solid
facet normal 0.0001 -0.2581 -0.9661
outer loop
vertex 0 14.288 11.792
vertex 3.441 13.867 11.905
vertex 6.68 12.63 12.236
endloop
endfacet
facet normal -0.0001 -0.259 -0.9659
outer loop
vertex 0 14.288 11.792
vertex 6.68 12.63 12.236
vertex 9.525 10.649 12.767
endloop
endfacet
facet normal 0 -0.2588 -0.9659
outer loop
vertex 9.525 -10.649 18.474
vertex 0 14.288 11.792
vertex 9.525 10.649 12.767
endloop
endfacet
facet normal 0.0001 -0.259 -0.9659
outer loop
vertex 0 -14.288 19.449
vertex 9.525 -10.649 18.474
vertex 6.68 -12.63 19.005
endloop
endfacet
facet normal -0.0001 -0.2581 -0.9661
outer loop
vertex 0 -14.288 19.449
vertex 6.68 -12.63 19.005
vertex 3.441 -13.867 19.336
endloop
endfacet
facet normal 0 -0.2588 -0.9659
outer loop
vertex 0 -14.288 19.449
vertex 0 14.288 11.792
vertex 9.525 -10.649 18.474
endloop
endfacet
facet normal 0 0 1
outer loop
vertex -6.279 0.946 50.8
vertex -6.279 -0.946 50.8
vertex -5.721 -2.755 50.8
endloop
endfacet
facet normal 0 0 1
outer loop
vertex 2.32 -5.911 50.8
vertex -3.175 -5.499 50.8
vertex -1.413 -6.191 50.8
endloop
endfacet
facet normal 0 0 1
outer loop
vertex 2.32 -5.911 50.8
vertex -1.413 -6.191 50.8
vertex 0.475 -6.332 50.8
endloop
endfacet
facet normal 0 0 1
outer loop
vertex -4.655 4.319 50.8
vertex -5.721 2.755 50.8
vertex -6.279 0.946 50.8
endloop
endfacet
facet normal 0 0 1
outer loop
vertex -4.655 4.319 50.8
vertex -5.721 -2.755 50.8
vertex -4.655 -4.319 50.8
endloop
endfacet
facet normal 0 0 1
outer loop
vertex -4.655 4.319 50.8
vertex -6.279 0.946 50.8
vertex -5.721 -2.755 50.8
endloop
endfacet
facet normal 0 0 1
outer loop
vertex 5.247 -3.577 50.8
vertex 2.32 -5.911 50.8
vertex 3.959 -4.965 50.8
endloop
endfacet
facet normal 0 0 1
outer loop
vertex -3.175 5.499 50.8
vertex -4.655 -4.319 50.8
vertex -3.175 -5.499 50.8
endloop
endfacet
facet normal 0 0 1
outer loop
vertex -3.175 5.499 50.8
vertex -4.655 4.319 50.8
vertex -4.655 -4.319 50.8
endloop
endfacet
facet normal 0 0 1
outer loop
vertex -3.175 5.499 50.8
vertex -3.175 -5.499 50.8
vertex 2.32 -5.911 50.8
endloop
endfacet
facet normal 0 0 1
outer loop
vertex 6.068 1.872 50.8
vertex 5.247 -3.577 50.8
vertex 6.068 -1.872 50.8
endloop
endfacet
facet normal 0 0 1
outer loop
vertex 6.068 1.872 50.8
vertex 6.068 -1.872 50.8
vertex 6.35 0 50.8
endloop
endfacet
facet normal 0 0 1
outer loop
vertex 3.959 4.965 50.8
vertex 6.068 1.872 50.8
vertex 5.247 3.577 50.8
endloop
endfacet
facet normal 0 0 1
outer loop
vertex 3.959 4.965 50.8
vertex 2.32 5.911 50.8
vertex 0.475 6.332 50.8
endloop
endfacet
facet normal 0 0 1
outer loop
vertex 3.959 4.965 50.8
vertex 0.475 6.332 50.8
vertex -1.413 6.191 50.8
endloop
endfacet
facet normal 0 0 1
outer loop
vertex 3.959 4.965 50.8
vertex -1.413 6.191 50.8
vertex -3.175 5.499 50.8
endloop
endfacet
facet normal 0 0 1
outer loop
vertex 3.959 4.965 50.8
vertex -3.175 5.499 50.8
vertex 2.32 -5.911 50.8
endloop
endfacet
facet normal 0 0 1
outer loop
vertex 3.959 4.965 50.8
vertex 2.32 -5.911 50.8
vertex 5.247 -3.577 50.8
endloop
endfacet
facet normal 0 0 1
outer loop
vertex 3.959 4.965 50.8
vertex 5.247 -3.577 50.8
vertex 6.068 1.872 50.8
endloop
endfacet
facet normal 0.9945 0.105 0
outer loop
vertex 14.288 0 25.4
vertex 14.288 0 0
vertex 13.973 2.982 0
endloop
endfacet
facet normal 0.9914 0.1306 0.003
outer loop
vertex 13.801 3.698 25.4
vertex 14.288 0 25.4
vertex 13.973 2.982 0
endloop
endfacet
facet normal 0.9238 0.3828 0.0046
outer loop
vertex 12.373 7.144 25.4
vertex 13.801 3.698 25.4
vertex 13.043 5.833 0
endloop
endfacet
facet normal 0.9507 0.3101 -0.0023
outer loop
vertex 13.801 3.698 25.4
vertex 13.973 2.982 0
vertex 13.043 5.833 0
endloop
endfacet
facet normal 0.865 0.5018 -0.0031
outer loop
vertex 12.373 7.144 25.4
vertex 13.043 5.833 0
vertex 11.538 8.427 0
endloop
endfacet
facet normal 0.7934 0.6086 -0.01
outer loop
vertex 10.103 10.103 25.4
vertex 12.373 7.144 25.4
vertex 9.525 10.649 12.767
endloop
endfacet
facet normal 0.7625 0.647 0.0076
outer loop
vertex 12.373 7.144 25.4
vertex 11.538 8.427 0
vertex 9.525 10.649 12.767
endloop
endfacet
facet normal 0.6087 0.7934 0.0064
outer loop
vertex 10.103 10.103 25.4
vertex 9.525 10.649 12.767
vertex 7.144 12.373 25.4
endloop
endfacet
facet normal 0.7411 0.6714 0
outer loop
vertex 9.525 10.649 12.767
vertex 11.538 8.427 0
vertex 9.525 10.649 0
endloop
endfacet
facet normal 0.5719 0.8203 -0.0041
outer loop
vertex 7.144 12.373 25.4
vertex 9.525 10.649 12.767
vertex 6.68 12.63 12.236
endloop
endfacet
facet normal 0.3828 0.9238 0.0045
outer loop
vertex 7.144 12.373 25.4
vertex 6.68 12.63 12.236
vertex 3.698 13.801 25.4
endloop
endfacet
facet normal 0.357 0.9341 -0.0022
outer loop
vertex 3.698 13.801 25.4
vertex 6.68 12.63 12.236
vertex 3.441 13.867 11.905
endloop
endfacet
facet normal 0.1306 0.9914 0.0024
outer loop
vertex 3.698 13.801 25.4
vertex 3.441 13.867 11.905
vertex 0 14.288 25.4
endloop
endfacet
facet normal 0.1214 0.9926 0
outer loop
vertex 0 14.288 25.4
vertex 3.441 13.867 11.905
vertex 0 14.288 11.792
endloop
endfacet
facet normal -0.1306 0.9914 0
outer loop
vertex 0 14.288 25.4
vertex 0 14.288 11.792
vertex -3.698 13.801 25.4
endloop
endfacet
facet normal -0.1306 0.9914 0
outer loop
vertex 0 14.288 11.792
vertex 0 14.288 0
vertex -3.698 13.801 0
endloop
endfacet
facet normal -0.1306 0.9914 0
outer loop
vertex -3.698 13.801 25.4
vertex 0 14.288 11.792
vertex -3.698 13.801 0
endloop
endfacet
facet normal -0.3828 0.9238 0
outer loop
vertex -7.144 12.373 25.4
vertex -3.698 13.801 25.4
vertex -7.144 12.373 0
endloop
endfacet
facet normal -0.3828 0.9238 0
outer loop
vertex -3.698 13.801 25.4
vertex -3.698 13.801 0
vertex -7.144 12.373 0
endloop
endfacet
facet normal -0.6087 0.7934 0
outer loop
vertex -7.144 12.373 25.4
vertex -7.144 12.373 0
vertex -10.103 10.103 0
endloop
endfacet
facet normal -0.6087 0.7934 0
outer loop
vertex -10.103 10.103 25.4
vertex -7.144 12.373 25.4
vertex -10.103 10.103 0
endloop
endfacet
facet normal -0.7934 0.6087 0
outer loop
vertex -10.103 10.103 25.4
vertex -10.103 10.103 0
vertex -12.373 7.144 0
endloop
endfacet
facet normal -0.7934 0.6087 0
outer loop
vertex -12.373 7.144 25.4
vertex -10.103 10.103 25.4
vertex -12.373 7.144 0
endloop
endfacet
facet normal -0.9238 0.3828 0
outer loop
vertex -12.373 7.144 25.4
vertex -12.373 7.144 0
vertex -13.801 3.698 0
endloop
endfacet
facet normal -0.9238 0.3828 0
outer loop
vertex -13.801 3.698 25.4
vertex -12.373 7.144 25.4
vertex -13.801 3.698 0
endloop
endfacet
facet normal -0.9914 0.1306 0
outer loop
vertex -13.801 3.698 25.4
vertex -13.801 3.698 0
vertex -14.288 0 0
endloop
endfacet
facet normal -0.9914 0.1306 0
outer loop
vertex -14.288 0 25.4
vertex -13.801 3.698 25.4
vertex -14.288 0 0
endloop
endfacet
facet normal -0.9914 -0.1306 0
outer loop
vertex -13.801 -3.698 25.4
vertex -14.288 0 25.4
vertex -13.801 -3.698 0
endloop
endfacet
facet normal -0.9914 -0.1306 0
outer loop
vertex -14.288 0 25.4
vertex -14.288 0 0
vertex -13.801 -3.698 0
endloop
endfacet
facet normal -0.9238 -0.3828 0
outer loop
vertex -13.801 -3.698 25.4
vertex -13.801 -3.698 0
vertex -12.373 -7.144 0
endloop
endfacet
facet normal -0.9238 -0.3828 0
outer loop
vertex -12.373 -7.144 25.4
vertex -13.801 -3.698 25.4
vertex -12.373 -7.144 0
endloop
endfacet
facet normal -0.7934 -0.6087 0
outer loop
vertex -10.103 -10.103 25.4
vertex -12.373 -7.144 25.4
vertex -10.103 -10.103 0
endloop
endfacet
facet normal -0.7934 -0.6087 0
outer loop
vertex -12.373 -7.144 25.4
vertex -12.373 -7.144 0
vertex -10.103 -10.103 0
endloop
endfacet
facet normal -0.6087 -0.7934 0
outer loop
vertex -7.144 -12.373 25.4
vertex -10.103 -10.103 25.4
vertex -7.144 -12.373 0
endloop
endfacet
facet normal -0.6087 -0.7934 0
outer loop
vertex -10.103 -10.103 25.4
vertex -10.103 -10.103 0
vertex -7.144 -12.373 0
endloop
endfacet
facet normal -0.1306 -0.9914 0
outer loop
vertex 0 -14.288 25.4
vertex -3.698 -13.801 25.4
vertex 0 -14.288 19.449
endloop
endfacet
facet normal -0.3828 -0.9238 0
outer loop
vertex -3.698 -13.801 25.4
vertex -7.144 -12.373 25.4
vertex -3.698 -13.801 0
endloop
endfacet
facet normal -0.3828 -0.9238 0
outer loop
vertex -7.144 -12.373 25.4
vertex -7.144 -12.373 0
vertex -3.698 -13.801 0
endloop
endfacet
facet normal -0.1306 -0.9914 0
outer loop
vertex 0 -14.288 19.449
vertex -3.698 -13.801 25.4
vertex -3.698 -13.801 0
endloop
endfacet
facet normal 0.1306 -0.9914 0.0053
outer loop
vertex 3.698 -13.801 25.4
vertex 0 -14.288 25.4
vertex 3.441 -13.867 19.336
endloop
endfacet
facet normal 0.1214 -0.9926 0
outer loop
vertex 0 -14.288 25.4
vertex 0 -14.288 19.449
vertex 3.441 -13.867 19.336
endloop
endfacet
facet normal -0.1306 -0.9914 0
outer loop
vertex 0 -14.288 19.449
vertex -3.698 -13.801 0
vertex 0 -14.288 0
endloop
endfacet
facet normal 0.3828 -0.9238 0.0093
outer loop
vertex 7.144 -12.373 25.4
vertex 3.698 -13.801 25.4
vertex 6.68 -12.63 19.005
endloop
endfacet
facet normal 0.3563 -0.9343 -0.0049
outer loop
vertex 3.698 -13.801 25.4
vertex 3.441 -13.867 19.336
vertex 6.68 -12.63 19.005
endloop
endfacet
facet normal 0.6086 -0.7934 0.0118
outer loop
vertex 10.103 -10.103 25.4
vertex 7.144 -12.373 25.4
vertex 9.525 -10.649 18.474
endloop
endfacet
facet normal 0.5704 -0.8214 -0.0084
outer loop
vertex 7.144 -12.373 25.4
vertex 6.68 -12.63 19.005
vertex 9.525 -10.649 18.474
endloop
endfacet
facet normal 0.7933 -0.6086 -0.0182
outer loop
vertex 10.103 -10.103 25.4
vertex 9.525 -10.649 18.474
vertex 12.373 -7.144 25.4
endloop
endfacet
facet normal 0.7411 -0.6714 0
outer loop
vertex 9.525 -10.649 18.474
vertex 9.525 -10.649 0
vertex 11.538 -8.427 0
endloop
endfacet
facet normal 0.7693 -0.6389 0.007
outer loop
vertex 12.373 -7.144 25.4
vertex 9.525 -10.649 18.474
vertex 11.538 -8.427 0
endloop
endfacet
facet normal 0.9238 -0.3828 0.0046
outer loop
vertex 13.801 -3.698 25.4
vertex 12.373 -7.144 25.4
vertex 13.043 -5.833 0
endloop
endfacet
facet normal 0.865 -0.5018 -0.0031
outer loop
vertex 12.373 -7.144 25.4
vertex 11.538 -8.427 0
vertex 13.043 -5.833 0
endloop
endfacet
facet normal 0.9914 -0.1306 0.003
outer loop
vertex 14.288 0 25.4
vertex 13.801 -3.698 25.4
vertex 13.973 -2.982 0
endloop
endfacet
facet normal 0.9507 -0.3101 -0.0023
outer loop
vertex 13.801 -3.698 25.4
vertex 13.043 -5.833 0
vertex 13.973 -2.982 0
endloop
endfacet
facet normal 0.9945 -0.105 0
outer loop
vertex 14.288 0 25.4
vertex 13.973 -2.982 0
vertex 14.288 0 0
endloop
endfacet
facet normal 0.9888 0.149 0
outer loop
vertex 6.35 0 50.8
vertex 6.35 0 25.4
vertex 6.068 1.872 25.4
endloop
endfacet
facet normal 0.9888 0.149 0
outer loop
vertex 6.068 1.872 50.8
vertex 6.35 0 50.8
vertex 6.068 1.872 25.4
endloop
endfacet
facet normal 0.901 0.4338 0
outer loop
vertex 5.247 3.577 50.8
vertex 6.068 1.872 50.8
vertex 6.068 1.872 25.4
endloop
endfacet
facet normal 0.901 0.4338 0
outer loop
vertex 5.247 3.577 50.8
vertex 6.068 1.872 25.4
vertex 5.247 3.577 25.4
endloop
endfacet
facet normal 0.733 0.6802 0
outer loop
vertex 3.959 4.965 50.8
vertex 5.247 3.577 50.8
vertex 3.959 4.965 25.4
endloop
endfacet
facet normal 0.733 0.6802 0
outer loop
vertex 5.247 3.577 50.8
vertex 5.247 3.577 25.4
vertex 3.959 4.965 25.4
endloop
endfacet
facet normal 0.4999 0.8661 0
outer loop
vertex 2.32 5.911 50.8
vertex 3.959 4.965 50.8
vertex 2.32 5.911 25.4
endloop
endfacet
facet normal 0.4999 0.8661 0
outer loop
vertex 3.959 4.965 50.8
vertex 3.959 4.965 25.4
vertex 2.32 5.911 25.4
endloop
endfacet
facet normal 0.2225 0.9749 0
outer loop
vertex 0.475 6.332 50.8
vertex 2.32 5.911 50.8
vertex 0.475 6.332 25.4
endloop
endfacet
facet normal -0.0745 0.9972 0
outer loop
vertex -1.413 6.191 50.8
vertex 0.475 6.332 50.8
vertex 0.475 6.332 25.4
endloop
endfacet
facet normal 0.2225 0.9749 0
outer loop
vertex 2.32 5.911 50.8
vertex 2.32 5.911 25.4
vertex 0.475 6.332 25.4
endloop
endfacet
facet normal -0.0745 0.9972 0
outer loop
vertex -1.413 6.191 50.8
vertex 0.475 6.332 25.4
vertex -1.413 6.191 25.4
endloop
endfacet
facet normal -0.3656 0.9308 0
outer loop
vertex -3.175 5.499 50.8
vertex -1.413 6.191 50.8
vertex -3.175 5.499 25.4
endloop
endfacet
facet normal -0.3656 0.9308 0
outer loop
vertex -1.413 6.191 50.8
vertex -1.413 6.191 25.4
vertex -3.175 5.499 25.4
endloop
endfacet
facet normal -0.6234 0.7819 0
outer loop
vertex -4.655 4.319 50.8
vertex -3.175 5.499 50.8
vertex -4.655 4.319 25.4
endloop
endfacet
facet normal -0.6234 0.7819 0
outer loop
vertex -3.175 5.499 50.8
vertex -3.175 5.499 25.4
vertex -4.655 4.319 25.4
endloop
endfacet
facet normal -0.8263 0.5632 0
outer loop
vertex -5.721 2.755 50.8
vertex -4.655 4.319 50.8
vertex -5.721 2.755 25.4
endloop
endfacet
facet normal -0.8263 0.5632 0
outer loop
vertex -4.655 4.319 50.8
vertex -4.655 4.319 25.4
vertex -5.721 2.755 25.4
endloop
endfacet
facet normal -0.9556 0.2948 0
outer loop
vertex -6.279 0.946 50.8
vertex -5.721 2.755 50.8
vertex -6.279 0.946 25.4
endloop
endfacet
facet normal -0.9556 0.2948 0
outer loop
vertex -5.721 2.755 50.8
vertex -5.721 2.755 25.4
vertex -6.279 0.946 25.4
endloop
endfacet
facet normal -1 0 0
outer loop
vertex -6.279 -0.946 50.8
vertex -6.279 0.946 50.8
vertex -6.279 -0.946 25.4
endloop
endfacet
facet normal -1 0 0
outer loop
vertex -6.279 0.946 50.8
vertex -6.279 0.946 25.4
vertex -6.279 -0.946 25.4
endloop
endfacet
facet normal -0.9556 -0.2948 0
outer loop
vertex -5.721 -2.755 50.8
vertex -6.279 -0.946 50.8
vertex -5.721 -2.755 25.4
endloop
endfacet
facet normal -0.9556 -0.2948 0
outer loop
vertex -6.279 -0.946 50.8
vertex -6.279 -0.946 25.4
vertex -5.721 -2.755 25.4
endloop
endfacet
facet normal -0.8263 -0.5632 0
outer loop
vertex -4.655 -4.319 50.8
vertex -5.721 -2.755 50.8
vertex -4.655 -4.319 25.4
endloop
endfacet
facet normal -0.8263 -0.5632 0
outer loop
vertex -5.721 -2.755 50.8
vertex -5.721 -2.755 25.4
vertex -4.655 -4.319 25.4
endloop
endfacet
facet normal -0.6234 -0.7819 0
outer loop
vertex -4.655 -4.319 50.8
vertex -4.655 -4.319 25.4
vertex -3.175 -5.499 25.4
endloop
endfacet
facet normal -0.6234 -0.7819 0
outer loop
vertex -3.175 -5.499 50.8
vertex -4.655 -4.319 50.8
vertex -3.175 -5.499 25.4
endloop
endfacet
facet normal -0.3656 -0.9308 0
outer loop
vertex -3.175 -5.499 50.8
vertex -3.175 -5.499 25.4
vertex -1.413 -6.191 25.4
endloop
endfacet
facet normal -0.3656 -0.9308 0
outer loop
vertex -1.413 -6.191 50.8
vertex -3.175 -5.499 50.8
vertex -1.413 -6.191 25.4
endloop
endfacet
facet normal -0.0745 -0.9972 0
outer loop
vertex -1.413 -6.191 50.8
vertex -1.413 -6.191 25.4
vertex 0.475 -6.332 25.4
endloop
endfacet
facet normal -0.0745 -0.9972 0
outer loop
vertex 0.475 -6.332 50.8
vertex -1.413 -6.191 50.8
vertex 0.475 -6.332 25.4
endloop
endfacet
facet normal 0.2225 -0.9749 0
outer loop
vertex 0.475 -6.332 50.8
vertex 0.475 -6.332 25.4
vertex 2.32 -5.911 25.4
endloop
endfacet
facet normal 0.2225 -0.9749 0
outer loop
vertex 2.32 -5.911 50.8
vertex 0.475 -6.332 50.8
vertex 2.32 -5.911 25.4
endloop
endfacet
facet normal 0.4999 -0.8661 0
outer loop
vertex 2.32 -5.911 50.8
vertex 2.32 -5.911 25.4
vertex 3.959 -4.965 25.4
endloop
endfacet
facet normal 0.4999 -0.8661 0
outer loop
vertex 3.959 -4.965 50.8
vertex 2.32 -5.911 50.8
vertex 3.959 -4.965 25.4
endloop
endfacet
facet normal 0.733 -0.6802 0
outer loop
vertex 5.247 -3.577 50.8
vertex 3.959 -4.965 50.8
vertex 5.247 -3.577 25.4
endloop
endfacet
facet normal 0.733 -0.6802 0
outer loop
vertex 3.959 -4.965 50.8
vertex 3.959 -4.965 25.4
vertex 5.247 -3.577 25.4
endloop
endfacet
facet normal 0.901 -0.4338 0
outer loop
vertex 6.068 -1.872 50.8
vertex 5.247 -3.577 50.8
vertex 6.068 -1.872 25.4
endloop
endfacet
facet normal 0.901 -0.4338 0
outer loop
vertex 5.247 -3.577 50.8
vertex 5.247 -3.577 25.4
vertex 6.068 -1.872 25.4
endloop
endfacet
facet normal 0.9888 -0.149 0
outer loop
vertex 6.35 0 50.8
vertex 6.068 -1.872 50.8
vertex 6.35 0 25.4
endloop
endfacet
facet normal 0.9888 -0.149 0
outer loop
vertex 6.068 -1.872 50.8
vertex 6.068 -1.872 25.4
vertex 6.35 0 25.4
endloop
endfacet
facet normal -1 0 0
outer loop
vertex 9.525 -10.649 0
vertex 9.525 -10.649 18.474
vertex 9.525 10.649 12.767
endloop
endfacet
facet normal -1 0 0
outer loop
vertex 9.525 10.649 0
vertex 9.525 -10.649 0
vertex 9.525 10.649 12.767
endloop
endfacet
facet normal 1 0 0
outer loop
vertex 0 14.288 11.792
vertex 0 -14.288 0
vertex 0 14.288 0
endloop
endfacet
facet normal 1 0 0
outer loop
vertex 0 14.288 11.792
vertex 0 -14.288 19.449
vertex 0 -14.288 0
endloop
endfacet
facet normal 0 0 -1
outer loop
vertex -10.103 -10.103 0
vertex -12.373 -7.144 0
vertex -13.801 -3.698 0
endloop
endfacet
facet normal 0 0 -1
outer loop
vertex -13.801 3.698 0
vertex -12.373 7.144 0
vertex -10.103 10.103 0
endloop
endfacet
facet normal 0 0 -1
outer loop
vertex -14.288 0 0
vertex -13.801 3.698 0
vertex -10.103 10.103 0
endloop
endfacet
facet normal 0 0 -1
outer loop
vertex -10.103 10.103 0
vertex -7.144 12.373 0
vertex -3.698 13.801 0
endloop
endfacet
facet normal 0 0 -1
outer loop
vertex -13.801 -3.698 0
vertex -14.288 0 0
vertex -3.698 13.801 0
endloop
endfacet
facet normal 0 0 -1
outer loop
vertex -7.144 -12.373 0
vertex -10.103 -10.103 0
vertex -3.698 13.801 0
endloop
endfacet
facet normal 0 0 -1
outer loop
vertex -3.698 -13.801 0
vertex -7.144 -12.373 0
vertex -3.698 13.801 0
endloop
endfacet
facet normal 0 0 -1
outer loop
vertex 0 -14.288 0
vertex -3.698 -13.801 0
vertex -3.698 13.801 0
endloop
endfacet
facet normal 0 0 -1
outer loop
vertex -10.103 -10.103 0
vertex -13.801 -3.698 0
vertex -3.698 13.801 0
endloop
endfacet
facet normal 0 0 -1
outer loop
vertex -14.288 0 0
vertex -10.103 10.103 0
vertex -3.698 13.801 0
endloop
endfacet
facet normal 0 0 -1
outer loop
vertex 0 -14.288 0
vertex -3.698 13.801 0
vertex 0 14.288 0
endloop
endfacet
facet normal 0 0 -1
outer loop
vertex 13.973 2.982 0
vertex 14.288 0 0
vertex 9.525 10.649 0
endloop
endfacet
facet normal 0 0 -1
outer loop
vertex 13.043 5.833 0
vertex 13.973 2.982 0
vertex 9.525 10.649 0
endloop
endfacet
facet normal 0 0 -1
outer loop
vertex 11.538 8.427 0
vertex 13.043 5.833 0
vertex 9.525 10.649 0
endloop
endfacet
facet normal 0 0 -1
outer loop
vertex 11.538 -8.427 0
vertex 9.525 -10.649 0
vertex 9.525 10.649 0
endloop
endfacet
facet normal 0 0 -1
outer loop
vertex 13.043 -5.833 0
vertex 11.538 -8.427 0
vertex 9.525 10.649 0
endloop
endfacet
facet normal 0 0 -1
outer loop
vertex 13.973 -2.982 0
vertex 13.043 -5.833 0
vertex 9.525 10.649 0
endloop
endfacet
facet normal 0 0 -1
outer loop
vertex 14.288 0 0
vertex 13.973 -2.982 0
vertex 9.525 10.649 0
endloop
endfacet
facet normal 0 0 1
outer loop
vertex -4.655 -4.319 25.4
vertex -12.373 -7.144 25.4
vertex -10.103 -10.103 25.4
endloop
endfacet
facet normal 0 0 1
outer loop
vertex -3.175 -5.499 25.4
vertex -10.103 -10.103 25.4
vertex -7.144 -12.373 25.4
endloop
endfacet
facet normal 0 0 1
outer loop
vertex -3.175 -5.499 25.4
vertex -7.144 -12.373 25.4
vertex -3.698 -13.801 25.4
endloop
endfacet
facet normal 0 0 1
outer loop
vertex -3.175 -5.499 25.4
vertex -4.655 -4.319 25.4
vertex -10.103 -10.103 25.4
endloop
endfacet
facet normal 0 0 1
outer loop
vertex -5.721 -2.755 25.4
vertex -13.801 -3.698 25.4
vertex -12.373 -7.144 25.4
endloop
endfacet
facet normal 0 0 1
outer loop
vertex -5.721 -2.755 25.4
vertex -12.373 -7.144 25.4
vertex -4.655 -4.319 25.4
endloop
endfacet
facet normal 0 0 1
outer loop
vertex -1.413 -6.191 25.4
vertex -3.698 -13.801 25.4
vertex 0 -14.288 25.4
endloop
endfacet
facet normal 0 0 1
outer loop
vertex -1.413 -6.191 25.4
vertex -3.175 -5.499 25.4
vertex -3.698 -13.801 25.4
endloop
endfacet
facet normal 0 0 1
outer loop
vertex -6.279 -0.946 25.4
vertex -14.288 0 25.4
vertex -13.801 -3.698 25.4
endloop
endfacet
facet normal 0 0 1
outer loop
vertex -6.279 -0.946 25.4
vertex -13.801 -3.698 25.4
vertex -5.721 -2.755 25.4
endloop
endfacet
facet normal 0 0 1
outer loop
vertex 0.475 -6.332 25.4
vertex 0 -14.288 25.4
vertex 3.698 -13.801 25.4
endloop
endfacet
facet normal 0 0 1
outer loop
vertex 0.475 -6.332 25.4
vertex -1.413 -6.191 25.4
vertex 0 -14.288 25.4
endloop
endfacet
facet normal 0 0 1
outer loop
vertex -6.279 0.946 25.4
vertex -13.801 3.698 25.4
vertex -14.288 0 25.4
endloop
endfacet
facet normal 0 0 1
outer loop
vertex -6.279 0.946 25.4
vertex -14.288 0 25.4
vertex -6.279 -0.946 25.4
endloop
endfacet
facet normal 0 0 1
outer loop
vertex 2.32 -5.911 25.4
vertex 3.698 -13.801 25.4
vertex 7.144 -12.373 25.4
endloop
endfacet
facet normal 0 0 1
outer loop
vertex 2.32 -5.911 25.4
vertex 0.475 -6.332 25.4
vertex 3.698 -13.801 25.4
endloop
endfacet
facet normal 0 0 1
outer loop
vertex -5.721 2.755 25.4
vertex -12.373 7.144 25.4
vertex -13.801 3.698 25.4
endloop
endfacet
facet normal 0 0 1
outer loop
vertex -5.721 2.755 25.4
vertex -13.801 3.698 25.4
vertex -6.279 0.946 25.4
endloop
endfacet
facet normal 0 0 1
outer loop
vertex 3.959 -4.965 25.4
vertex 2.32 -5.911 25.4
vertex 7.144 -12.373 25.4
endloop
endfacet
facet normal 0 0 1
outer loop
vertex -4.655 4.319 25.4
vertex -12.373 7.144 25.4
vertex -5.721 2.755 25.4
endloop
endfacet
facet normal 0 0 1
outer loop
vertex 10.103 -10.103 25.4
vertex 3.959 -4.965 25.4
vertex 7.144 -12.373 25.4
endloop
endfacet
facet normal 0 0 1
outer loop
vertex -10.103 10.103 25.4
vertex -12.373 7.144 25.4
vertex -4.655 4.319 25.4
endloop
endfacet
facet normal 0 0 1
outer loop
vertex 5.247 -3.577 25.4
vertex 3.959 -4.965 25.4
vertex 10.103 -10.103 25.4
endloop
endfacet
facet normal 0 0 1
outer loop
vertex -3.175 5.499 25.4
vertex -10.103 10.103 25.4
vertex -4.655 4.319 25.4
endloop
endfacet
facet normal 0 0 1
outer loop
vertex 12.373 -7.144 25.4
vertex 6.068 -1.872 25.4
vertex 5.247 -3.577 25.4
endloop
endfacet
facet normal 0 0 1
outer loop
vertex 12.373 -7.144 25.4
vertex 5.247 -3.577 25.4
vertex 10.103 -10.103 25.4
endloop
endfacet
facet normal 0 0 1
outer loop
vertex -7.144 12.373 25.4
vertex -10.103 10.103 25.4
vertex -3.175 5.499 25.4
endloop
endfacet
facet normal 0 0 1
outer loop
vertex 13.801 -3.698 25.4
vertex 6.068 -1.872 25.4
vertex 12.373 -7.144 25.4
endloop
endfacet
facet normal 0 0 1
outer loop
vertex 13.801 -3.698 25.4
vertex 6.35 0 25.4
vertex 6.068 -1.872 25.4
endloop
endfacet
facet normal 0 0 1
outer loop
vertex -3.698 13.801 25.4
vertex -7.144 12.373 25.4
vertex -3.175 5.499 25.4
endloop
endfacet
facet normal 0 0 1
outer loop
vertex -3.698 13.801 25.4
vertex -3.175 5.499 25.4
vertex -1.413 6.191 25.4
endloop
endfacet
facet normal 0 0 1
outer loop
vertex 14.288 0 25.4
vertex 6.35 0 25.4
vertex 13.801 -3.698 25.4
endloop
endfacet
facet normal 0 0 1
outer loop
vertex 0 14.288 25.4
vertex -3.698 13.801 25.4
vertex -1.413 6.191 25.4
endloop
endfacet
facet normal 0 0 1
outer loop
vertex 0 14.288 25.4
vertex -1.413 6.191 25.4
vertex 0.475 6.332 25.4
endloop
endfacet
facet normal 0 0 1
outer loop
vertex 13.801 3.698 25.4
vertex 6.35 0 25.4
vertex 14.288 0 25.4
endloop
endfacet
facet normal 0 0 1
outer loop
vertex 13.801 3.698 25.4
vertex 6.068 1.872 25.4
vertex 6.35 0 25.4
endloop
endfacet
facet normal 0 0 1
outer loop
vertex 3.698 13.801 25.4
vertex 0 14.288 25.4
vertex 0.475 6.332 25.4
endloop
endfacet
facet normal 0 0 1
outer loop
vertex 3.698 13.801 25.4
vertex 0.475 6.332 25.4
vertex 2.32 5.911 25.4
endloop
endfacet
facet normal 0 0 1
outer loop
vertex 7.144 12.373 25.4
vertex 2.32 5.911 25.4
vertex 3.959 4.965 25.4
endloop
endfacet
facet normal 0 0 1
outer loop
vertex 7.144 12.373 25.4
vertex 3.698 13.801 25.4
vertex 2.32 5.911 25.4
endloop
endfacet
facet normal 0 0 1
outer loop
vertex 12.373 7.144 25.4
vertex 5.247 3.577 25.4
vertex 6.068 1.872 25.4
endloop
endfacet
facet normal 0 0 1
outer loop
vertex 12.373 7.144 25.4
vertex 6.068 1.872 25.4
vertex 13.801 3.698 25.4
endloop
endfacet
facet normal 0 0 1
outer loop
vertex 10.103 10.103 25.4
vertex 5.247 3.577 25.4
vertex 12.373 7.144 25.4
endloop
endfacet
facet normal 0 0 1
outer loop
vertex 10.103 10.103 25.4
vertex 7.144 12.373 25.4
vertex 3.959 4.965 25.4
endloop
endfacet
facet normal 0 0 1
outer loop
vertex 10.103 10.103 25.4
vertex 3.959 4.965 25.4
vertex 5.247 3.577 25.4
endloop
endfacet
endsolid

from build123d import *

# Parameters (mm, degrees)
F0_R     = 14.2875
F1_DEPTH = 25.4
F2_R     = 6.35
F3_DEPTH = 25.4
F7_DEPTH = 9.525


with BuildPart() as f1:
    # F0 (on Top) → F1 (new body)
    with BuildSketch(Plane.XY):
        Circle(F0_R)
    extrude(amount=F1_DEPTH)

    # F2 (on face) → F3 (join)
    with BuildSketch(Plane.XY.offset(25.4)):
        Circle(F2_R)
    extrude(amount=F3_DEPTH)

    # F6 (on Right) → F7 (cut)
    with BuildSketch(Plane.YZ):
        Polygon((-14.2875, 0), (-11.1125, 0), (11.103606, 0), (14.2875, 0), (14.2875, 11.79217), (-14.2875, 19.448818), align=None)
    extrude(amount=F7_DEPTH, mode=Mode.SUBTRACT)


solid = f1.part
